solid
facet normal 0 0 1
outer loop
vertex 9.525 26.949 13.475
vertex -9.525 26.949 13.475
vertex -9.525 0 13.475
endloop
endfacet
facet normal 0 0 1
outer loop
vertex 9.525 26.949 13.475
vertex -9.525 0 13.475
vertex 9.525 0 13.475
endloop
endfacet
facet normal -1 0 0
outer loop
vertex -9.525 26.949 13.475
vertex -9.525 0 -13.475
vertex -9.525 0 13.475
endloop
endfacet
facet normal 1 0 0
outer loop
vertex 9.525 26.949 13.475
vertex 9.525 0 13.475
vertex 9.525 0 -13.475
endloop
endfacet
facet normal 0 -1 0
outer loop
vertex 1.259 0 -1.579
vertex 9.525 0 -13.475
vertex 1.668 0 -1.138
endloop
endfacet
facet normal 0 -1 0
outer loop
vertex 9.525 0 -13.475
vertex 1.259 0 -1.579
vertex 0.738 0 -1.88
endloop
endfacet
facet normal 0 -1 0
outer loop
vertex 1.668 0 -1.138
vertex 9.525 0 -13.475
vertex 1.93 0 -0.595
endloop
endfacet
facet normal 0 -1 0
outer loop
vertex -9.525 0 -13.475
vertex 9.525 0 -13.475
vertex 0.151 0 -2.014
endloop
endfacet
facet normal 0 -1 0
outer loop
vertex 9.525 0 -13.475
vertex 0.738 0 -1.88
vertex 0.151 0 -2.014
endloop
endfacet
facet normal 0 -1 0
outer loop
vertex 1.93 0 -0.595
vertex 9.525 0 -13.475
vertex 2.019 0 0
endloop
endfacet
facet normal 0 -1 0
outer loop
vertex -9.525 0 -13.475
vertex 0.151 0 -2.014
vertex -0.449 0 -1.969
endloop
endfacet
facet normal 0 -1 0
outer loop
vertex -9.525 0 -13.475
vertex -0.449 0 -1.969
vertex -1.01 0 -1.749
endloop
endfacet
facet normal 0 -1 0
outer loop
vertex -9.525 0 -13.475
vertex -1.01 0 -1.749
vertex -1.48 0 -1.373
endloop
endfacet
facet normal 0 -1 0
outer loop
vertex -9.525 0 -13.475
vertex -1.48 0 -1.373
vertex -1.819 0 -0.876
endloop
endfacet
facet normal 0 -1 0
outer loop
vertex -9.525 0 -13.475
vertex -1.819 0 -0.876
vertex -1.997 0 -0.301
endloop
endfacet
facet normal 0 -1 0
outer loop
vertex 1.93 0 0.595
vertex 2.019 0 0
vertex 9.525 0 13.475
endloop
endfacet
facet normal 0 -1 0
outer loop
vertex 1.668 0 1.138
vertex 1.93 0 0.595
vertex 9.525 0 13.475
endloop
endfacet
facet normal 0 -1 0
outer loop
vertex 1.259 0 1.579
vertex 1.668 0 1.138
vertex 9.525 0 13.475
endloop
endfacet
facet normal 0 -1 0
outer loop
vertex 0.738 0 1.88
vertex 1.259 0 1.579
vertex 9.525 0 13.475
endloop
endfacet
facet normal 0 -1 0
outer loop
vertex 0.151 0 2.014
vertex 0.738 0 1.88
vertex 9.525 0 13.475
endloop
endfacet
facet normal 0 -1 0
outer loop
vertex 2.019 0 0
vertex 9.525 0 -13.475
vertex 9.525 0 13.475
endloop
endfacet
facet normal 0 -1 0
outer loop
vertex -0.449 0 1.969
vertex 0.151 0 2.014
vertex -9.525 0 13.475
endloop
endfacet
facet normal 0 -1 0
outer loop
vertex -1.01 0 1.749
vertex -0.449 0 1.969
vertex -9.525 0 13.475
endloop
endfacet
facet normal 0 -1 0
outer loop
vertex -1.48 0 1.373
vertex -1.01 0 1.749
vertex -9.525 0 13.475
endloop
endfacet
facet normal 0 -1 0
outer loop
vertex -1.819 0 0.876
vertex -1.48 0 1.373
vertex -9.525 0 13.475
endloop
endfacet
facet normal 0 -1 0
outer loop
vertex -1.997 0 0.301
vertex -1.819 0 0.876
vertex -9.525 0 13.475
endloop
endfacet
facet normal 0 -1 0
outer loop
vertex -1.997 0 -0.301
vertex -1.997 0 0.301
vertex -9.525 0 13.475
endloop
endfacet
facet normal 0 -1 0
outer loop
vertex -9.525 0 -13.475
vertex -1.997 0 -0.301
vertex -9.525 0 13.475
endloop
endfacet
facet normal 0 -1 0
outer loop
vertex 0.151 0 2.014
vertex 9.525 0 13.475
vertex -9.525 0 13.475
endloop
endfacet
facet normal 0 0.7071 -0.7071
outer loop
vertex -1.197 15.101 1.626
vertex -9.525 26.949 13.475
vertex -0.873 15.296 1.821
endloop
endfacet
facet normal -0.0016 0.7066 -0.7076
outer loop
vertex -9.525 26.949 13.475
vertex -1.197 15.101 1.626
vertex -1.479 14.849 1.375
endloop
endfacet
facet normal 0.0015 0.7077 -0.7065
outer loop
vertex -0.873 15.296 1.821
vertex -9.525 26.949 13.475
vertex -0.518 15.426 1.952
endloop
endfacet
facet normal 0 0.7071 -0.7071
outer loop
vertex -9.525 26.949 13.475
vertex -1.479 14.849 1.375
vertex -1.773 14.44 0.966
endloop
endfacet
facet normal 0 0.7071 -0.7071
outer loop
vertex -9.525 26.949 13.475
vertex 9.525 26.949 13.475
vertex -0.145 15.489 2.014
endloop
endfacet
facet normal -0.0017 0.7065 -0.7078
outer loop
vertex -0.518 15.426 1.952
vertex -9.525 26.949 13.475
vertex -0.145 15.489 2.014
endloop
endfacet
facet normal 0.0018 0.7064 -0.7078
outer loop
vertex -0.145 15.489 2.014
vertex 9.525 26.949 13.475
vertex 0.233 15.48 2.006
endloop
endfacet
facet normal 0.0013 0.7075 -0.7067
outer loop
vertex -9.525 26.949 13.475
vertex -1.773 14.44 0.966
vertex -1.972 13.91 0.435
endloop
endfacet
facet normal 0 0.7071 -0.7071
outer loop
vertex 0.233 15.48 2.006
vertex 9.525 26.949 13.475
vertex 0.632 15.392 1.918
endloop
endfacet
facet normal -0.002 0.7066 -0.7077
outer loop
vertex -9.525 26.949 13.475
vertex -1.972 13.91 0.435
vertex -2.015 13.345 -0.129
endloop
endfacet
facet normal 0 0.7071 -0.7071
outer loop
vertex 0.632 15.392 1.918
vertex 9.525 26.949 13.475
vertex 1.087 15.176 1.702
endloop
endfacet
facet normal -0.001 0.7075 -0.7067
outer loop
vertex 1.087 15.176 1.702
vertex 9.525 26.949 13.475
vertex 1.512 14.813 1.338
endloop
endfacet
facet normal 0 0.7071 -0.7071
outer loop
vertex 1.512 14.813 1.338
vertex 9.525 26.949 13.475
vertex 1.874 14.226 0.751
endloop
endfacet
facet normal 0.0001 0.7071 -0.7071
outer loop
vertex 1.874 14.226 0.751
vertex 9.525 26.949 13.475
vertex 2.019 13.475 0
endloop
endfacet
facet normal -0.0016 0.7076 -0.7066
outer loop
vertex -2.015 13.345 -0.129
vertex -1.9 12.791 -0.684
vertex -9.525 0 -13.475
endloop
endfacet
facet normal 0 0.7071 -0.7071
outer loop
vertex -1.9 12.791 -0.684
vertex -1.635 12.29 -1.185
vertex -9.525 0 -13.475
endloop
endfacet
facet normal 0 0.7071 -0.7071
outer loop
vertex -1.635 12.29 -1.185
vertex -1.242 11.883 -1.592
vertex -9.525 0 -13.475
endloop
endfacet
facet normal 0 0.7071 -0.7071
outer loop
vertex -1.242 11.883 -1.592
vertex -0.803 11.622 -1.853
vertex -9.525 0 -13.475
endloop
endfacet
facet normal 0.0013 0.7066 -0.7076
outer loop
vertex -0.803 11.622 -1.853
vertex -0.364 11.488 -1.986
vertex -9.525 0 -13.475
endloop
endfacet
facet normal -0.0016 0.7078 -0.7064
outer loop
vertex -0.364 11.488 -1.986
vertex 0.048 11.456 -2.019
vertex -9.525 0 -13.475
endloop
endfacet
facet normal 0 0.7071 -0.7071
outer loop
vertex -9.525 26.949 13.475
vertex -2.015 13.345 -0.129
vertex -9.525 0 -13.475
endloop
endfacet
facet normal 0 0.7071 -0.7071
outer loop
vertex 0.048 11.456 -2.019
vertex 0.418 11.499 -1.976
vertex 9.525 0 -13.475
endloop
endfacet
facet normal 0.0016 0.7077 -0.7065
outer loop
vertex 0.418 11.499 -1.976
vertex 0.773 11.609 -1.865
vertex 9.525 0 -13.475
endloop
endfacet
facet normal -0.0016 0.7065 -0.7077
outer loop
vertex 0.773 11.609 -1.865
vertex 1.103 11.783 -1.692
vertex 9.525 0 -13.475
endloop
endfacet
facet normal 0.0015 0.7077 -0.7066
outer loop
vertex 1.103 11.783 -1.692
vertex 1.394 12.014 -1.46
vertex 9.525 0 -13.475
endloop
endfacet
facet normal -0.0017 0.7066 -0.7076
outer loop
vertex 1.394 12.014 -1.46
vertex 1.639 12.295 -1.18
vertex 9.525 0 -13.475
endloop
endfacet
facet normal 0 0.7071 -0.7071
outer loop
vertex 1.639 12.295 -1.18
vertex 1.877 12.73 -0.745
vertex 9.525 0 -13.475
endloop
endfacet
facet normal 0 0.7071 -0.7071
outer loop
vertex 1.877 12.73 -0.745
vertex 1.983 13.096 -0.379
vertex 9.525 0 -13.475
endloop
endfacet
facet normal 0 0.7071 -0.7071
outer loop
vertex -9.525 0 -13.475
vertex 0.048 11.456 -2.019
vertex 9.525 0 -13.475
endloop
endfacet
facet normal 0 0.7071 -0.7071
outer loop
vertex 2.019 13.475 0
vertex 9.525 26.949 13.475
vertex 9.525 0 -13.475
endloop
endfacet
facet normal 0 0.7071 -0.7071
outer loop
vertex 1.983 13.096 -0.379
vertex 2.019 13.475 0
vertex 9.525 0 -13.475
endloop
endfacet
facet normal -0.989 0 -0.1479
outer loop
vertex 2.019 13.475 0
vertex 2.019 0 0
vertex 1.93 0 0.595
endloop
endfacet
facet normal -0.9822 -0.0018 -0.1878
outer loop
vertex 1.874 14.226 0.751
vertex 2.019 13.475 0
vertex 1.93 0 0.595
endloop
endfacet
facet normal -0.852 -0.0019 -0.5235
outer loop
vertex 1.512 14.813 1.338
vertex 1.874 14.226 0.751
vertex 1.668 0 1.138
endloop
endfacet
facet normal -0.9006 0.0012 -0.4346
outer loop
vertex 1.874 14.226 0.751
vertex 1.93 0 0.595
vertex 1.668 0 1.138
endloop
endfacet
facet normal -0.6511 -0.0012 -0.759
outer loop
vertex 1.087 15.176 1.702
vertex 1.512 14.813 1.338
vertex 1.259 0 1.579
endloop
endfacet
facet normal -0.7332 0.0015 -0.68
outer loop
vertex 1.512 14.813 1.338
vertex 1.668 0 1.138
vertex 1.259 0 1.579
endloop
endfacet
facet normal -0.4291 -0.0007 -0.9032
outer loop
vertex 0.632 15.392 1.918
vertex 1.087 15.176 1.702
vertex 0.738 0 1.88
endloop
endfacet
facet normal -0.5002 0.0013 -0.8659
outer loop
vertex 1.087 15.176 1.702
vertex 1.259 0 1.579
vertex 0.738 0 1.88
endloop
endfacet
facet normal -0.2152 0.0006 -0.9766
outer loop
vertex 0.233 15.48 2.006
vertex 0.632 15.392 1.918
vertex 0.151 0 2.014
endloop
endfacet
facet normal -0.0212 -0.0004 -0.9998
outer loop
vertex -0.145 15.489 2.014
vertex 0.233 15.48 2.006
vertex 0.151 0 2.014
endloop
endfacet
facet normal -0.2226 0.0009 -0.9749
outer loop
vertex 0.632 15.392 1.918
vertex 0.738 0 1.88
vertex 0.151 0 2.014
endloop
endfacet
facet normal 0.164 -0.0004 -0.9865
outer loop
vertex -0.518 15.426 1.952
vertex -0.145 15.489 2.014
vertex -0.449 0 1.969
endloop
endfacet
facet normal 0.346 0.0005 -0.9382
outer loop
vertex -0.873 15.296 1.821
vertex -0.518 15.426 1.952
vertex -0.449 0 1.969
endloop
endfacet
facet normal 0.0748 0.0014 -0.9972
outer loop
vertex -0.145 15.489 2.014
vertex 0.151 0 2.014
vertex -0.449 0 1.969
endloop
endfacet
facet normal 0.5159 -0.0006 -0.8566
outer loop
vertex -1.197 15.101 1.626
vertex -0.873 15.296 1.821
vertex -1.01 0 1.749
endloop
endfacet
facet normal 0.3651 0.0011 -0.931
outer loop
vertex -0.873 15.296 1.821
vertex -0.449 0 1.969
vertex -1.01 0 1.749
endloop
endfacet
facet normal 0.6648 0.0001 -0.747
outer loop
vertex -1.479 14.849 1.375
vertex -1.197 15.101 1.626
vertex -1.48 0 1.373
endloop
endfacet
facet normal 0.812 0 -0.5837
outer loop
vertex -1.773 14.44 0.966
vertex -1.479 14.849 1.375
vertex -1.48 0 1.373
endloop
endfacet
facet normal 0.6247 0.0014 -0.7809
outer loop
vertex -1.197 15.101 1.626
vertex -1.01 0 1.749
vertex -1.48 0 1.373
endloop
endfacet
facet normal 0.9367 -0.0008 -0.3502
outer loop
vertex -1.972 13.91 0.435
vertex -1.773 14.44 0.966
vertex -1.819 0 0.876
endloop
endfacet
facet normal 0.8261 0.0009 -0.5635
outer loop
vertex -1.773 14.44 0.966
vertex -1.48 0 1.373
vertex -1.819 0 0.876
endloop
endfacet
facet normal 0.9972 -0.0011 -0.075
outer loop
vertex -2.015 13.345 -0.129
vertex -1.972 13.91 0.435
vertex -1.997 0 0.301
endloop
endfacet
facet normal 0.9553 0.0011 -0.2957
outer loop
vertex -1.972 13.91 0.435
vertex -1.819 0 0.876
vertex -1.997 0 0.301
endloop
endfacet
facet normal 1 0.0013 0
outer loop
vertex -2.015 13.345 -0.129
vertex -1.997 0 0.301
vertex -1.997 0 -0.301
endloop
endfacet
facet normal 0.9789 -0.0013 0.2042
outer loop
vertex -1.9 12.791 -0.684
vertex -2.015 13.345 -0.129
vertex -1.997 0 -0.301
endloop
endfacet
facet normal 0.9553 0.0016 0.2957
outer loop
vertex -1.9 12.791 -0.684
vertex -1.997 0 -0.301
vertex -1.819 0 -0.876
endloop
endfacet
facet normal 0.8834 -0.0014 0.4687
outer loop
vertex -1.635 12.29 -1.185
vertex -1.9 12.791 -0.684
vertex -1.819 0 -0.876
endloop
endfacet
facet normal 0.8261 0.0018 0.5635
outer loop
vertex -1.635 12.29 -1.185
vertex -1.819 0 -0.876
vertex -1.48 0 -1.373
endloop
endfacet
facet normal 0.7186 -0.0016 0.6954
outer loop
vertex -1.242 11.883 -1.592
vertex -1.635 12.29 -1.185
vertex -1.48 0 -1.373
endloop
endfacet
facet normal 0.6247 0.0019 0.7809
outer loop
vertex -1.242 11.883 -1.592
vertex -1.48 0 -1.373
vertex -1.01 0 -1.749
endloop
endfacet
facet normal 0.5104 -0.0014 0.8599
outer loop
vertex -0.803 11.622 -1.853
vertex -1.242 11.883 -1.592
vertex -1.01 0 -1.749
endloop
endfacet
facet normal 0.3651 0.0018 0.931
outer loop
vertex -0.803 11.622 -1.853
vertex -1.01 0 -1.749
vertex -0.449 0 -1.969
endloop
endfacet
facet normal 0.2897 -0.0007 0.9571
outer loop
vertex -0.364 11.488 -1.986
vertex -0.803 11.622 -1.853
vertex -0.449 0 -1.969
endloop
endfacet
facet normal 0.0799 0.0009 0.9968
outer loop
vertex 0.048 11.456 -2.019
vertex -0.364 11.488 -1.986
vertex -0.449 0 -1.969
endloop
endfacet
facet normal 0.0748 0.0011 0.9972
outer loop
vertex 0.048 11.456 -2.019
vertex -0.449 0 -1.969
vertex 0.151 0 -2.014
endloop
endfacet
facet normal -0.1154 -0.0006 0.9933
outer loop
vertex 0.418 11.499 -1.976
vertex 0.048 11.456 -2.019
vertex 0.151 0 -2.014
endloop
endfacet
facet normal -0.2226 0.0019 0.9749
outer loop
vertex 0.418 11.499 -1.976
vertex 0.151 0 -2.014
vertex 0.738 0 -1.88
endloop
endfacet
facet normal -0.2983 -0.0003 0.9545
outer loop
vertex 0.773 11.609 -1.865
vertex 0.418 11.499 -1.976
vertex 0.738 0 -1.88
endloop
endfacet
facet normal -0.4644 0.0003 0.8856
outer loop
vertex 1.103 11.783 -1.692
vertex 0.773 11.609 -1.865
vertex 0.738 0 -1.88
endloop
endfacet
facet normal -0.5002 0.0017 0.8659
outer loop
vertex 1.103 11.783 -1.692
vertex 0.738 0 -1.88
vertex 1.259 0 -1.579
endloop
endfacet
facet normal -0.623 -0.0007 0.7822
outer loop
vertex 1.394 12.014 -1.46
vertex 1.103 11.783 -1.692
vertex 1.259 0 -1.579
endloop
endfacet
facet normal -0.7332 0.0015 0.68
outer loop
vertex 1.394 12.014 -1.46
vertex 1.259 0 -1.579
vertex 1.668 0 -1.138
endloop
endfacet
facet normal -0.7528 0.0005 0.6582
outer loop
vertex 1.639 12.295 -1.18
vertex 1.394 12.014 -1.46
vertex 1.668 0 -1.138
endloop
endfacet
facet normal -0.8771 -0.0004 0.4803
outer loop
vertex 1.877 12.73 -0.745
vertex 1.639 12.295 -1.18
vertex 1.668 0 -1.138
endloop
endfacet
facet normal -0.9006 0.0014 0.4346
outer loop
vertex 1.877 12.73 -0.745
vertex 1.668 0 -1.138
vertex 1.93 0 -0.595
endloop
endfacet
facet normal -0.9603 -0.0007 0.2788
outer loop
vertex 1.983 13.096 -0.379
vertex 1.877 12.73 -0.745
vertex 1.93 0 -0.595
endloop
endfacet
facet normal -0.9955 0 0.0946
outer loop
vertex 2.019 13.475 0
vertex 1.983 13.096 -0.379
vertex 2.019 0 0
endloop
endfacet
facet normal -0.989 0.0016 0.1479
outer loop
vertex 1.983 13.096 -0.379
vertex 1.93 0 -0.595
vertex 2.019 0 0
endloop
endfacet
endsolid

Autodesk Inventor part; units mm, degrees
ref_plane "YZ Plane" through (0, 0, 0) normal (1, 0, 0) x (0, 1, 0)
ref_plane "XZ Plane" through (0, 0, 0) normal (0, 1, 0) x (-1, 0, 0)
ref_plane "XY Plane" through (0, 0, 0) normal (0, 0, 1) x (1, 0, 0)
sketch "Sketch1" plane through (0, 0, 0) normal (0, 1, 0) x (-1, 0, 0)
  line L0 (-9.525, -13.4747) -> (9.525, -13.4747)
  line L1 (9.525, -13.4747) -> (9.525, 13.4747)
  line L2 (9.525, 13.4747) -> (-9.525, 13.4747)
  line L3 (-9.525, 13.4747) -> (-9.525, -13.4747)
  line L4 (-9.525, -13.4747) -> (9.525, 13.4747) construction
  line L5 (9.525, -13.4747) -> (-9.525, 13.4747) construction
  point P0 (0, 0)
  dimension "d0" = 19.05
  dimension "d1" = 26.9494
extrude "Extrusion1" add sketch "Sketch1" along normal blind 26.9494
sketch "Sketch2" plane through (9.525, 0, 13.4747) normal (1, 0, 0) x (0, 0, -1)
  line L0 (26.9494, 26.9494) -> (0, 26.9494) projected
  line L1 (0, 26.9494) -> (26.9494, 0)
  line L2 (0, 0) -> (26.9494, 0) projected
  line L3 (26.9494, 0) -> (26.9494, 26.9494) projected
  line L4 (0, 26.9494) -> (26.9494, 26.9494) projected
  line L5 (0, 0) -> (0, 26.9494) projected
  point P0 (13.4747, 0)
extrude "Extrusion2" cut sketch "Sketch2" against normal blind 19.05 contours L3 L1 L0
sketch "Sketch3" plane through (0, 0, 0) normal (0, -1, 0) x (1, 0, 0)
  circle A0 centre (0, 0) radius 2.0193
  dimension "d6" = 4.0386
extrude "Extrusion3" cut sketch "Sketch3" against normal blind 19.05
thread "Thread1" size "10-32 UNF" class "2B" standard "ANSI Unified Screw Threads" full length
properties part number "STRU_011_BilletWedge" material "Aluminum 6061"
